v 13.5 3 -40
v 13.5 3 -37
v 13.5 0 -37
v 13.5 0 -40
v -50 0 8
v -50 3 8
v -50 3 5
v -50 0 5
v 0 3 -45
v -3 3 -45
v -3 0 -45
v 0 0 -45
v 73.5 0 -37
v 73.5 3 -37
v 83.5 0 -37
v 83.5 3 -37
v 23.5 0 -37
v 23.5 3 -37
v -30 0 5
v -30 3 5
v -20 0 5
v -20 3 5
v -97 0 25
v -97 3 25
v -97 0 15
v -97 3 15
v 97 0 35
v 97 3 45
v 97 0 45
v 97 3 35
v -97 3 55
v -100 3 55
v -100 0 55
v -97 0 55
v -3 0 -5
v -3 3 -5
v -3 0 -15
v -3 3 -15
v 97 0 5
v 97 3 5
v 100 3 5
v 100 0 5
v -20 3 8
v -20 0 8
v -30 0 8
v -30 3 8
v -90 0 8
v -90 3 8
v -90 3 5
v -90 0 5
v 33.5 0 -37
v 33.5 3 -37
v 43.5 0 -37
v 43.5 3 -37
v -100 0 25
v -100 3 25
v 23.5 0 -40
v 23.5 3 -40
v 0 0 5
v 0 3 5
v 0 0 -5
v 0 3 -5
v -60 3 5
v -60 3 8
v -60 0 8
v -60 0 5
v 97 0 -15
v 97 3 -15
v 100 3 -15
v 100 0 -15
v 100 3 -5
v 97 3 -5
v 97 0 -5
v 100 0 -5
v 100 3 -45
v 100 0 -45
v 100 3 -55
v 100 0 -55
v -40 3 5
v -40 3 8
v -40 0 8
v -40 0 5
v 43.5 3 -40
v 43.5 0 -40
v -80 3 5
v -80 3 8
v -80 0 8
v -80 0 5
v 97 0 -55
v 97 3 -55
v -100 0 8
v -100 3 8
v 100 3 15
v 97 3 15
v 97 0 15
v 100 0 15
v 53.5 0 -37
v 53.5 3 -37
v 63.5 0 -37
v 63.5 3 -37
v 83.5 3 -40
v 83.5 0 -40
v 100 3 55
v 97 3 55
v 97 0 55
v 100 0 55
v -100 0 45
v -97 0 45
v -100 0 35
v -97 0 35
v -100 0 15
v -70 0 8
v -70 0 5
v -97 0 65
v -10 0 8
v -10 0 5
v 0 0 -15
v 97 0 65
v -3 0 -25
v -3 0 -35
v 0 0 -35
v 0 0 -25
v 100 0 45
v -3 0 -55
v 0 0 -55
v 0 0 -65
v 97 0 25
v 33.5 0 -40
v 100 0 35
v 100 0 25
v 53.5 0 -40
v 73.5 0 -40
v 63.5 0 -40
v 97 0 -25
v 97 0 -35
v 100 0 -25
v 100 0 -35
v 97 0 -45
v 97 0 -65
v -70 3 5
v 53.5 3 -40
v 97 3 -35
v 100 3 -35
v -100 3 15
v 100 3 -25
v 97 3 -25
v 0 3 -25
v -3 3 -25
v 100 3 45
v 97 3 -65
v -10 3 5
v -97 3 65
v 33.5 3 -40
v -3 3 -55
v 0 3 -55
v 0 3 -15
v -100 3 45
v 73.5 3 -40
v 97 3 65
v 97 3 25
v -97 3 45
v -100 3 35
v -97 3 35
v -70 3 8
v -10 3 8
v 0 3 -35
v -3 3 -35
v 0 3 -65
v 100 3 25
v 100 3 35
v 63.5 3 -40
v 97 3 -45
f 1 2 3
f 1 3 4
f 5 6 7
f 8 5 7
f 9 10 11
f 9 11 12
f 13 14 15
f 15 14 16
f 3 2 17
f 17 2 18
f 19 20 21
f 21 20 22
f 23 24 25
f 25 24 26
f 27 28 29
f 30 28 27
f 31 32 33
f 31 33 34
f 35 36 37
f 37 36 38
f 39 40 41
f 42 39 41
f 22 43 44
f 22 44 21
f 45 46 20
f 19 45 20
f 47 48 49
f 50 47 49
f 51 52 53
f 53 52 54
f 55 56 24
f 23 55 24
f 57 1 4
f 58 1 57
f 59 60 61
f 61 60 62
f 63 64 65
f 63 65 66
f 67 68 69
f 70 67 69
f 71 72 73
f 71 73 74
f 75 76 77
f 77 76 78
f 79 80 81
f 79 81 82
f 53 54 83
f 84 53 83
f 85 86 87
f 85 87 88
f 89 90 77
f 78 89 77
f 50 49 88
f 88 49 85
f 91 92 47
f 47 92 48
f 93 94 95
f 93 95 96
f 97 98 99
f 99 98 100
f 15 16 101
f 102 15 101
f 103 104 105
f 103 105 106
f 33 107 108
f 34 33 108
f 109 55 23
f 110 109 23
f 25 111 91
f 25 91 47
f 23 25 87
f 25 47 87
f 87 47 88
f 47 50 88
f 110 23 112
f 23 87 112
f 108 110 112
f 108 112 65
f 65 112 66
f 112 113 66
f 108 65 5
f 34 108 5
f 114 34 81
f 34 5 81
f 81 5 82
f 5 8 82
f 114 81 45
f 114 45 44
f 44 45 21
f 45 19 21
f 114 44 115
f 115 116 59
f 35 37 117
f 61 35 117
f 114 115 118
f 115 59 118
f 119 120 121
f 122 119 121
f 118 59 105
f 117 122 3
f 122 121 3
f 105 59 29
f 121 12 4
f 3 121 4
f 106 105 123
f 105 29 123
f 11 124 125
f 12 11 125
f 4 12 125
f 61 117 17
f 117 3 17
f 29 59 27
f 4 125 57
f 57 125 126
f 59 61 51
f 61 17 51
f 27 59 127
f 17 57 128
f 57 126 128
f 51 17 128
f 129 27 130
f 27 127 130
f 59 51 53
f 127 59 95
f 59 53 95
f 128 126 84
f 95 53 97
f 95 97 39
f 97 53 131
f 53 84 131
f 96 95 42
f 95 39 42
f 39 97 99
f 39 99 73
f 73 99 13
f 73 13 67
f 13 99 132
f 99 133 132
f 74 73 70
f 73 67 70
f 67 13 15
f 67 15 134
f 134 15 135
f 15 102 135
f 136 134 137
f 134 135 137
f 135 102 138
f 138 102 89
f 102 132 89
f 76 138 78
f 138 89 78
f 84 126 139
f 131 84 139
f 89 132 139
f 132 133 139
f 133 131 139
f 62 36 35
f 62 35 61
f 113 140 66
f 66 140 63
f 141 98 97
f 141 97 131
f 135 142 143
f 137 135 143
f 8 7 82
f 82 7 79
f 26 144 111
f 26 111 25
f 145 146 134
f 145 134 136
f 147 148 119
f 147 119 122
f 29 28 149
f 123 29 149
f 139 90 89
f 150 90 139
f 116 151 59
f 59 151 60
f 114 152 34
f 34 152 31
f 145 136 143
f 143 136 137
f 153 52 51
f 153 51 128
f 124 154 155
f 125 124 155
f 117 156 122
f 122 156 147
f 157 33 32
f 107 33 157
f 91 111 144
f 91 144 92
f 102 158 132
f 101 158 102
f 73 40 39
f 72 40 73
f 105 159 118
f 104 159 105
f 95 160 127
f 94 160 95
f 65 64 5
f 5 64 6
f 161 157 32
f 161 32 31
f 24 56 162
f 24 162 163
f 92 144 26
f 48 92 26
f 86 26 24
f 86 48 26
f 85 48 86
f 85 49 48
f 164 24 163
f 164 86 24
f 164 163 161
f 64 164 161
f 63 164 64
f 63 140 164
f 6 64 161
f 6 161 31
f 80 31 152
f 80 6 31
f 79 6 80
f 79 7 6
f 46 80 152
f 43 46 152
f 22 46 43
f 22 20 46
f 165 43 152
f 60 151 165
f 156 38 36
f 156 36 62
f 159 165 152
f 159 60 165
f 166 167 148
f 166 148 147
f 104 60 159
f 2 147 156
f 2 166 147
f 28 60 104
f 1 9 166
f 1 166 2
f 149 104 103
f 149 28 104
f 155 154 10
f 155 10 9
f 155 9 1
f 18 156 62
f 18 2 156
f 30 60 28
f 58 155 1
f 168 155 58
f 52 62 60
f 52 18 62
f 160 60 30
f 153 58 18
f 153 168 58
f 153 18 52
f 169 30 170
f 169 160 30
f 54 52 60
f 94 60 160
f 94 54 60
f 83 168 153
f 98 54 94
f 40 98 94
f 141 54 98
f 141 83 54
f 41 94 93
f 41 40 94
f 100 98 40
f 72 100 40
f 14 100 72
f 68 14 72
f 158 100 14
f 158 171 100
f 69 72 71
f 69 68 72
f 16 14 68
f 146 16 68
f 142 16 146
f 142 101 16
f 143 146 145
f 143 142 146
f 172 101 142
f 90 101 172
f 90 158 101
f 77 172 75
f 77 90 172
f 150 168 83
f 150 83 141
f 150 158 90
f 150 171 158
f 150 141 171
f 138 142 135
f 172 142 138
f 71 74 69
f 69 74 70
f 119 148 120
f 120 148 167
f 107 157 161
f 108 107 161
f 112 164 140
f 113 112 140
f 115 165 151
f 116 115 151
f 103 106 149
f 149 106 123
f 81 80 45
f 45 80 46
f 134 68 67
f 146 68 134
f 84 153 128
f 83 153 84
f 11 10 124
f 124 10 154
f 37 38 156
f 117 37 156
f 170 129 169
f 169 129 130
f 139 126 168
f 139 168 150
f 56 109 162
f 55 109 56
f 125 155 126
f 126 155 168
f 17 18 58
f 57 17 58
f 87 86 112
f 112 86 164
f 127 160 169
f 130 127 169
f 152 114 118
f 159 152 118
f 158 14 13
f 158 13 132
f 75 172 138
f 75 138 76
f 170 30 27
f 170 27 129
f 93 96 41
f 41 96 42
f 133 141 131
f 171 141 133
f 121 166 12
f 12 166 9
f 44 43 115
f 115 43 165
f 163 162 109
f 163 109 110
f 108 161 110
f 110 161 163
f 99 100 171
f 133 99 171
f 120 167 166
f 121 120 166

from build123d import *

# Parameters (mm, degrees)
SKETCH1_W           = 200
SKETCH1_H           = 130
BOSS_EXTRUDE1_DEPTH = 3
SKETCH2_W           = 97
SKETCH2_H           = 70
CUT_EXTRUDE1_DEPTH  = 120.306328416
SKETCH3_W           = 3
SKETCH3_H           = 10
CUT_EXTRUDE2_DEPTH  = 120.306328416
LPATTERN1_COUNT     = 3
LPATTERN1_PITCH     = 20
SKETCH4_W           = 3
SKETCH4_H           = 10
CUT_EXTRUDE3_DEPTH  = 120.306328416
LPATTERN2_COUNT     = 7
LPATTERN2_PITCH     = 20
SKETCH5_W           = 3
SKETCH5_H           = 10
CUT_EXTRUDE4_DEPTH  = 120.306328416
LPATTERN3_COUNT     = 4
LPATTERN3_PITCH     = 20
SKETCH7_W           = 10
SKETCH7_H           = 3
CUT_EXTRUDE7_DEPTH  = 120.306328416
LPATTERN6_COUNT     = 5
LPATTERN6_PITCH     = 20
SKETCH8_W           = 10
SKETCH8_H           = 3
CUT_EXTRUDE8_DEPTH  = 120.306328416
LPATTERN8_COUNT     = 4
LPATTERN8_PITCH     = 20


with BuildPart() as part:
    # Sketch1 → Boss-Extrude1 (new body)
    with BuildSketch(Plane(origin=(0, 0, 0), x_dir=(1, 0, 0), z_dir=(0, 1, 0))):
        Rectangle(SKETCH1_W, SKETCH1_H)
    extrude(amount=BOSS_EXTRUDE1_DEPTH)

    # Sketch2 → Cut-Extrude1 (cut, through all)
    with BuildSketch(Plane(origin=(0, 3, 0), x_dir=(1, 0, 0), z_dir=(0, 1, 0))):
        with Locations((-51.5, 30)):
            Rectangle(SKETCH2_W, SKETCH2_H)
    extrude(amount=-CUT_EXTRUDE1_DEPTH, mode=Mode.SUBTRACT)

    # Sketch3 → Cut-Extrude2 (cut, through all)
    with BuildSketch(Plane(origin=(0, 3, 0), x_dir=(1, 0, 0), z_dir=(0, 1, 0))):
        with Locations((-98.5, -60)):
            Rectangle(SKETCH3_W, SKETCH3_H)
    cut_extrude2 = extrude(amount=-CUT_EXTRUDE2_DEPTH, mode=Mode.SUBTRACT)

    # LPattern1: Cut-Extrude2 ×3
    with Locations(*[(0, 0, -i * LPATTERN1_PITCH) for i in range(1, LPATTERN1_COUNT)]):
        add(cut_extrude2, mode=Mode.SUBTRACT)

    # Sketch4 → Cut-Extrude3 (cut, through all)
    with BuildSketch(Plane(origin=(0, 3, 0), x_dir=(1, 0, 0), z_dir=(0, 1, 0))):
        with Locations((98.5, -60)):
            Rectangle(SKETCH4_W, SKETCH4_H)
    cut_extrude3 = extrude(amount=-CUT_EXTRUDE3_DEPTH, mode=Mode.SUBTRACT)

    # LPattern2: Cut-Extrude3 ×7
    with Locations(*[(0, 0, -i * LPATTERN2_PITCH) for i in range(1, LPATTERN2_COUNT)]):
        add(cut_extrude3, mode=Mode.SUBTRACT)

    # Sketch5 → Cut-Extrude4 (cut, through all)
    with BuildSketch(Plane(origin=(0, 3, 0), x_dir=(1, 0, 0), z_dir=(0, 1, 0))):
        with Locations((-1.5, 60)):
            Rectangle(SKETCH5_W, SKETCH5_H)
    cut_extrude4 = extrude(amount=-CUT_EXTRUDE4_DEPTH, mode=Mode.SUBTRACT)

    # LPattern3: Cut-Extrude4 ×4
    with Locations(*[(0, 0, i * LPATTERN3_PITCH) for i in range(1, LPATTERN3_COUNT)]):
        add(cut_extrude4, mode=Mode.SUBTRACT)

    # Sketch7 → Cut-Extrude7 (cut, through all)
    with BuildSketch(Plane(origin=(0, 3, 0), x_dir=(1, 0, 0), z_dir=(0, 1, 0))):
        with Locations((-15, -6.5)):
            Rectangle(SKETCH7_W, SKETCH7_H)
    cut_extrude7 = extrude(amount=-CUT_EXTRUDE7_DEPTH, mode=Mode.SUBTRACT)

    # LPattern6: Cut-Extrude7 ×5
    with Locations(*[(-i * LPATTERN6_PITCH, 0, 0) for i in range(1, LPATTERN6_COUNT)]):
        add(cut_extrude7, mode=Mode.SUBTRACT)

    # Sketch8 → Cut-Extrude8 (cut, through all)
    with BuildSketch(Plane(origin=(0, 3, 0), x_dir=(1, 0, 0), z_dir=(0, 1, 0))):
        with Locations((78.5, 38.5)):
            Rectangle(SKETCH8_W, SKETCH8_H)
    cut_extrude8 = extrude(amount=-CUT_EXTRUDE8_DEPTH, mode=Mode.SUBTRACT)

    # LPattern8: Cut-Extrude8 ×4
    with Locations(*[(-i * LPATTERN8_PITCH, 0, 0) for i in range(1, LPATTERN8_COUNT)]):
        add(cut_extrude8, mode=Mode.SUBTRACT)


solid = part.part
